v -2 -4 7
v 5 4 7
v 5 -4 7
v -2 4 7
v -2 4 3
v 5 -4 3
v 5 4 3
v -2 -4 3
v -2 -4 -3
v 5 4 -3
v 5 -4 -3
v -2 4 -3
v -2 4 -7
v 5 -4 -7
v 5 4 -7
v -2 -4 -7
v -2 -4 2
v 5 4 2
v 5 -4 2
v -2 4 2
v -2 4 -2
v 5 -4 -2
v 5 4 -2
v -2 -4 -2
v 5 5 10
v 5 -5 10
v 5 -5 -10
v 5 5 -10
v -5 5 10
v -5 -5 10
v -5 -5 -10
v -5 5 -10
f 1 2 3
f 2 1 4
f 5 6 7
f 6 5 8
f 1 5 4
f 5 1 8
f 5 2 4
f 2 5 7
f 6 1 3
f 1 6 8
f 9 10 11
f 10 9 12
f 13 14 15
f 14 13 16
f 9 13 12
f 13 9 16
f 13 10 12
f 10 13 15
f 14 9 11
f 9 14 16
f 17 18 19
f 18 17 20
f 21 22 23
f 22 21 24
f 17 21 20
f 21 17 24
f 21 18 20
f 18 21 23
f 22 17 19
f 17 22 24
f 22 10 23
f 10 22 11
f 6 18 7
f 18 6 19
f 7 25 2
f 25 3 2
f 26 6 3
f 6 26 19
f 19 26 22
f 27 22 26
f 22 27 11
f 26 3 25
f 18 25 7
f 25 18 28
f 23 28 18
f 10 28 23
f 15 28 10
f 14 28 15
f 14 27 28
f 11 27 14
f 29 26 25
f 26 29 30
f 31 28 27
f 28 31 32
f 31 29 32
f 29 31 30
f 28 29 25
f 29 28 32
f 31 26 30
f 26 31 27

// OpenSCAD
module Bookshelf_01(){
    difference(){
        color("#664433")
        cube([10,10,20],center=true);

        color("#ada192"){
        translate([2,0,5])
        cube([8,8,4],center=true);

        translate([2,0,-5])
        cube([8,8,4],center=true);


        translate([2,0,0])
        cube([8,8,4],center=true);

        translate([2,0,-5])
        cube([8,8,4],center=true);
        }
    }
}


Bookshelf_01();


// Written by Nicolì Angelo (Gengio) 2024: 
// MIT License


//Permission is hereby granted, free of charge, to any person obtaining a copy of this software and associated documentation files (the "Software"), to deal in the Software without restriction, including without limitation the rights to use, copy, modify, merge, publish, distribute, sublicense, and/or sell copies of the Software, and to permit persons to whom the Software is furnished to do so, subject to the following conditions:

//The above copyright notice and this permission notice shall be included in all copies or substantial portions of the Software.

//THE SOFTWARE IS PROVIDED "AS IS", WITHOUT WARRANTY OF ANY KIND, EXPRESS OR IMPLIED, INCLUDING BUT NOT LIMITED TO THE WARRANTIES OF MERCHANTABILITY, FITNESS FOR A PARTICULAR PURPOSE AND NONINFRINGEMENT. IN NO EVENT SHALL THE AUTHORS OR COPYRIGHT HOLDERS BE LIABLE FOR ANY CLAIM, DAMAGES OR OTHER LIABILITY, WHETHER IN AN ACTION OF CONTRACT, TORT OR OTHERWISE, ARISING FROM, OUT OF OR IN CONNECTION WITH THE SOFTWARE OR THE USE OR OTHER DEALINGS IN THE SOFTWARE.
